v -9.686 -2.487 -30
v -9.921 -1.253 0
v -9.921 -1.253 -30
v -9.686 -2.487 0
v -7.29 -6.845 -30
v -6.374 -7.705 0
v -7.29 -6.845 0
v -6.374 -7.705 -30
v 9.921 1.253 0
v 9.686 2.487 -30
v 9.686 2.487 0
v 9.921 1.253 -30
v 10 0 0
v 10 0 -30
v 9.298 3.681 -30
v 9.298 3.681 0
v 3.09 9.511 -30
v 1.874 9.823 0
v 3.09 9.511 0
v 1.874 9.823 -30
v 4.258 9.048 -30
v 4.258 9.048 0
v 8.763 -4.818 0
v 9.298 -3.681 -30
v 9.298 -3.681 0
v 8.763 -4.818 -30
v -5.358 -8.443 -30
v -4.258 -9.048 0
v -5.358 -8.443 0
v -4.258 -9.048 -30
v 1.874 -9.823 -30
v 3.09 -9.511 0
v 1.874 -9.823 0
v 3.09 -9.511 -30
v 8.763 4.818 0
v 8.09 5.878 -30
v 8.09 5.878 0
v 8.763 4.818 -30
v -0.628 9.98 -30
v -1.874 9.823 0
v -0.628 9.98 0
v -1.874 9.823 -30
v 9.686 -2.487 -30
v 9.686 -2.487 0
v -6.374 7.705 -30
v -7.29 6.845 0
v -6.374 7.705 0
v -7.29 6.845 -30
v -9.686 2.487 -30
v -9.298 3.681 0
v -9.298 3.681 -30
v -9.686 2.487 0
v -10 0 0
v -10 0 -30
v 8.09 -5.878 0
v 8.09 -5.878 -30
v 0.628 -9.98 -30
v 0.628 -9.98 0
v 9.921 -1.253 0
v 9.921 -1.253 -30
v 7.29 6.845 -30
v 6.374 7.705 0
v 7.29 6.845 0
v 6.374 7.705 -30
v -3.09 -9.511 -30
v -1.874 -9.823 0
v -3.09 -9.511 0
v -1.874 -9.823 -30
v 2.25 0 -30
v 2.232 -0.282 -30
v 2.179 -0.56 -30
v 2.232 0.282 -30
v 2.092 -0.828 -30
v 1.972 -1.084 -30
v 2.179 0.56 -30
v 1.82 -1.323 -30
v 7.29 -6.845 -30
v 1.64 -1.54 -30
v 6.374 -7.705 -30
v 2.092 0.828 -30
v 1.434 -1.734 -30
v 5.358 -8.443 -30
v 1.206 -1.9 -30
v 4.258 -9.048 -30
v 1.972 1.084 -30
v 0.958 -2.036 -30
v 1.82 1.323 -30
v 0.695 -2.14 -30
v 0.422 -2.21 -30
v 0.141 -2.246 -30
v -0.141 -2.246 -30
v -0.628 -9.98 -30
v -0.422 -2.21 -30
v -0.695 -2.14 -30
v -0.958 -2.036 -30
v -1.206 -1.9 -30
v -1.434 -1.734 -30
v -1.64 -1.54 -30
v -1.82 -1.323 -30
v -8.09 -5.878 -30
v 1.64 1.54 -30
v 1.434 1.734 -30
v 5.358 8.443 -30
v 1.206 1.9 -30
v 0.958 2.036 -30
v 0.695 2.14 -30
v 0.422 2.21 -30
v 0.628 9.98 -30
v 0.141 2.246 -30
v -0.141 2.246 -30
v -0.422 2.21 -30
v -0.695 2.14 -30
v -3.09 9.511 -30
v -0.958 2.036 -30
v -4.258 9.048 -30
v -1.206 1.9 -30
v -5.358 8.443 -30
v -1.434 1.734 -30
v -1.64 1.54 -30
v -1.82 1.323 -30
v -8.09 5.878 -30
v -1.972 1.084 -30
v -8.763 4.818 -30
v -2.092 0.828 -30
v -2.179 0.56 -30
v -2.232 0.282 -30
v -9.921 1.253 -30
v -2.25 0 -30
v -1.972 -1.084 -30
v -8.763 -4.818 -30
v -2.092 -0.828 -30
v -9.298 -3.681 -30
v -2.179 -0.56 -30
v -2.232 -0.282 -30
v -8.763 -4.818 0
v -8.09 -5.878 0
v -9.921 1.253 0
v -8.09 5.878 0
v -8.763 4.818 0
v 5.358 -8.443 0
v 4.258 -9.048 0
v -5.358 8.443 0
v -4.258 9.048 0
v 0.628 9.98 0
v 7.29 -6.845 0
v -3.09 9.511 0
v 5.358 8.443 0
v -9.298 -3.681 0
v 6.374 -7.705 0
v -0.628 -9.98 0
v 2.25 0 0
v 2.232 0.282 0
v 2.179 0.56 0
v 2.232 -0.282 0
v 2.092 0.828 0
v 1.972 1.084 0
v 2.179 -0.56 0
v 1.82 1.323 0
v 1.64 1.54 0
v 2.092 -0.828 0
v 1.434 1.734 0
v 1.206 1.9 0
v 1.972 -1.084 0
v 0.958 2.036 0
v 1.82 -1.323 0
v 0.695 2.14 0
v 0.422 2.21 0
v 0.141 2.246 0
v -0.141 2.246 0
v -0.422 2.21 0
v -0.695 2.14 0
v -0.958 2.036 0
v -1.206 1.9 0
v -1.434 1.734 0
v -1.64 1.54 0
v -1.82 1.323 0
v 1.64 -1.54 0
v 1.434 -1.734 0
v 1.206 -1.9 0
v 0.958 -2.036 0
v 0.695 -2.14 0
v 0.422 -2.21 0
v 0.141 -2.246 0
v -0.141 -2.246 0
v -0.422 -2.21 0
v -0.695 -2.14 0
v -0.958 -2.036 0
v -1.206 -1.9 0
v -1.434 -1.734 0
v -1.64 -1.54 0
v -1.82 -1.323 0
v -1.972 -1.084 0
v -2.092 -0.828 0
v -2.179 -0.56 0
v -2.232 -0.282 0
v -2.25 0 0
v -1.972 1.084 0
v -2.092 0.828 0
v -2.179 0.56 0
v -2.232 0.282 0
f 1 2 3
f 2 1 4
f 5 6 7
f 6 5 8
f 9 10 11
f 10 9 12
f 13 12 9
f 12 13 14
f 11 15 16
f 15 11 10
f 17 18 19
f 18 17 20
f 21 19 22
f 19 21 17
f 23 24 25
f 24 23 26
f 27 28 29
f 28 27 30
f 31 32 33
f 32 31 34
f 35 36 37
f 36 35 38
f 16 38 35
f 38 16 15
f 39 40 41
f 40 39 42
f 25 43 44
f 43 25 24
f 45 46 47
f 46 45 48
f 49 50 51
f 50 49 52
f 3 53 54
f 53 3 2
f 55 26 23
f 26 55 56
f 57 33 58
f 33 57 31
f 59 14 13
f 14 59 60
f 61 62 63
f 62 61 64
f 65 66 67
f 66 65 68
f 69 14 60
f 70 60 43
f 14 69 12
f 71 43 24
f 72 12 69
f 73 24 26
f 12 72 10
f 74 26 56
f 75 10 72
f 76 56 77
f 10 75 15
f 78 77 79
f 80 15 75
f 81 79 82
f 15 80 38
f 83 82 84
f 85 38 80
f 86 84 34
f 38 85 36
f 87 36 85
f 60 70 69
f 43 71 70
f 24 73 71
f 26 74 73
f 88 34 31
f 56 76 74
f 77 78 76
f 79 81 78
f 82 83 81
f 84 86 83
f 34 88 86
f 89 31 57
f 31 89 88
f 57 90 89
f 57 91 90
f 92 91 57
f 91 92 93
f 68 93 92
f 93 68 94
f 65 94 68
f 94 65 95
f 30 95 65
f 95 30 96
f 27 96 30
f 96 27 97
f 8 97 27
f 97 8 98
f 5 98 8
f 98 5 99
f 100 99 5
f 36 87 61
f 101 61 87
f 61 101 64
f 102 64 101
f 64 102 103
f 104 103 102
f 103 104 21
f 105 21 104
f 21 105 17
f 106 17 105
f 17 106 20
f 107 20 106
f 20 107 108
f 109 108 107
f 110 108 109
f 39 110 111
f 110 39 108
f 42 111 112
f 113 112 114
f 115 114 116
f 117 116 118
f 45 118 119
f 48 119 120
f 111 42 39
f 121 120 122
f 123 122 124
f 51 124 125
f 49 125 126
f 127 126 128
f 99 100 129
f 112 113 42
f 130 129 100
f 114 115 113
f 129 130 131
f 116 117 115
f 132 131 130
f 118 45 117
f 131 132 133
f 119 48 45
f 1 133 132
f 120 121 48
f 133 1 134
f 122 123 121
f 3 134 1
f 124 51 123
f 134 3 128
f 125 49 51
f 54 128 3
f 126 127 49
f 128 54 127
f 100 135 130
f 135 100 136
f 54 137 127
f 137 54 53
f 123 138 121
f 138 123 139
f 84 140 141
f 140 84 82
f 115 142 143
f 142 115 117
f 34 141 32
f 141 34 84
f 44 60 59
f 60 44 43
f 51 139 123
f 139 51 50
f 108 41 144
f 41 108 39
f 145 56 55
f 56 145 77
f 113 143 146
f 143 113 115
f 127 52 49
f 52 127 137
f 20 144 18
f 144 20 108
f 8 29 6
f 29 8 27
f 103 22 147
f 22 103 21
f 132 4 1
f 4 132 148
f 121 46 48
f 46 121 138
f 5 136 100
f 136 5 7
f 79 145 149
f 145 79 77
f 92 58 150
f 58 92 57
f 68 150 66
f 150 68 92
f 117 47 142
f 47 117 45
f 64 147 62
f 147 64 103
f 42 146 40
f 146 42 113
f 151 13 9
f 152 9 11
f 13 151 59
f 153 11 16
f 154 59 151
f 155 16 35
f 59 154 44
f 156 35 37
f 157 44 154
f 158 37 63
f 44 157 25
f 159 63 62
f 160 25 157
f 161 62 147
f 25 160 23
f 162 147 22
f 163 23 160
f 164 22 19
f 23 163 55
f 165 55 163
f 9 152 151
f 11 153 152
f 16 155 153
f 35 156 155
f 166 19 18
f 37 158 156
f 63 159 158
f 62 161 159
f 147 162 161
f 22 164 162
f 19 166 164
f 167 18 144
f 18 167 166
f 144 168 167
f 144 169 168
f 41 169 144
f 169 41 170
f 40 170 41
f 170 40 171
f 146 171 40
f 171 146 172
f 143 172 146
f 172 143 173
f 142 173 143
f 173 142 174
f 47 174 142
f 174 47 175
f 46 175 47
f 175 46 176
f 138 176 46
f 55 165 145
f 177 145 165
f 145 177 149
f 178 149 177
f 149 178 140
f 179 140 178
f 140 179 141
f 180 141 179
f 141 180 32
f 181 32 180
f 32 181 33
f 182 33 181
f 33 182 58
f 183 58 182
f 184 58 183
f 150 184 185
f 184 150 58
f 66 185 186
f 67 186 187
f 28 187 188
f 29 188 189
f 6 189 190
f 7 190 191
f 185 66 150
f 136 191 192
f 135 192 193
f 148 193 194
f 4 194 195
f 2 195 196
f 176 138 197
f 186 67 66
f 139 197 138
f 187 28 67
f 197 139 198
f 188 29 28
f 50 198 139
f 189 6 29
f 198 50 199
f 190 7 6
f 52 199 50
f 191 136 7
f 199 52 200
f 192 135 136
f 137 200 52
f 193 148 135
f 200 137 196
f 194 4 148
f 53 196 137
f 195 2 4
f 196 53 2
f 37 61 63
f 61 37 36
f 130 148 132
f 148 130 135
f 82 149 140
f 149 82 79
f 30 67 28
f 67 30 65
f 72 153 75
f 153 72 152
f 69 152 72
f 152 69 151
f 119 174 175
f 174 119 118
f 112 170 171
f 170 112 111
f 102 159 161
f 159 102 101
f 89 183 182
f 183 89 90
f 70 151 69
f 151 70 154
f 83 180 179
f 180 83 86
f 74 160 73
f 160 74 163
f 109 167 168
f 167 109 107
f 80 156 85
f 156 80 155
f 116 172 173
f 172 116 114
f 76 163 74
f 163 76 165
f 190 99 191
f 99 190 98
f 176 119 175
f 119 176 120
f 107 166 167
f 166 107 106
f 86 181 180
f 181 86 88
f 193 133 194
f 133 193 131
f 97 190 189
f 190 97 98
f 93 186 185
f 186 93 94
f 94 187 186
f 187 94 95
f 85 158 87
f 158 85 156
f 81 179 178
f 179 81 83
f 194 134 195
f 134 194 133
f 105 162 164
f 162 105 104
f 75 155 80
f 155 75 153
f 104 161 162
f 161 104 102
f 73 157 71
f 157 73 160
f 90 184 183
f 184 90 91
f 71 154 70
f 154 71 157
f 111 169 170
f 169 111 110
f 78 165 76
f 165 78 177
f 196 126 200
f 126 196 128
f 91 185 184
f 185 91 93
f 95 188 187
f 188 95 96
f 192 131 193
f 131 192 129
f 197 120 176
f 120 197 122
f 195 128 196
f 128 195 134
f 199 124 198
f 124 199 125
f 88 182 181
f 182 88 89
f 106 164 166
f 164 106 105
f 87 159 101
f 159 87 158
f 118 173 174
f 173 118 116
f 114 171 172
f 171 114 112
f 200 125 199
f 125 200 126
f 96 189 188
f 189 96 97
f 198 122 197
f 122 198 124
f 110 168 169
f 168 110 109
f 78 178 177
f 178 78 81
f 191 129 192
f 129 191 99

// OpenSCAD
$fn = 50;


difference() {
	union() {
		translate(v = [0, 0, -30.0000000000]) {
			cylinder(h = 30, r = 10.0000000000);
		}
		cylinder(h = 0, r = 19.0000000000);
	}
	union() {
		#translate(v = [0, 0, -30]) {
			cylinder(h = 30, r = 2.2500000000);
		}
	}
}
